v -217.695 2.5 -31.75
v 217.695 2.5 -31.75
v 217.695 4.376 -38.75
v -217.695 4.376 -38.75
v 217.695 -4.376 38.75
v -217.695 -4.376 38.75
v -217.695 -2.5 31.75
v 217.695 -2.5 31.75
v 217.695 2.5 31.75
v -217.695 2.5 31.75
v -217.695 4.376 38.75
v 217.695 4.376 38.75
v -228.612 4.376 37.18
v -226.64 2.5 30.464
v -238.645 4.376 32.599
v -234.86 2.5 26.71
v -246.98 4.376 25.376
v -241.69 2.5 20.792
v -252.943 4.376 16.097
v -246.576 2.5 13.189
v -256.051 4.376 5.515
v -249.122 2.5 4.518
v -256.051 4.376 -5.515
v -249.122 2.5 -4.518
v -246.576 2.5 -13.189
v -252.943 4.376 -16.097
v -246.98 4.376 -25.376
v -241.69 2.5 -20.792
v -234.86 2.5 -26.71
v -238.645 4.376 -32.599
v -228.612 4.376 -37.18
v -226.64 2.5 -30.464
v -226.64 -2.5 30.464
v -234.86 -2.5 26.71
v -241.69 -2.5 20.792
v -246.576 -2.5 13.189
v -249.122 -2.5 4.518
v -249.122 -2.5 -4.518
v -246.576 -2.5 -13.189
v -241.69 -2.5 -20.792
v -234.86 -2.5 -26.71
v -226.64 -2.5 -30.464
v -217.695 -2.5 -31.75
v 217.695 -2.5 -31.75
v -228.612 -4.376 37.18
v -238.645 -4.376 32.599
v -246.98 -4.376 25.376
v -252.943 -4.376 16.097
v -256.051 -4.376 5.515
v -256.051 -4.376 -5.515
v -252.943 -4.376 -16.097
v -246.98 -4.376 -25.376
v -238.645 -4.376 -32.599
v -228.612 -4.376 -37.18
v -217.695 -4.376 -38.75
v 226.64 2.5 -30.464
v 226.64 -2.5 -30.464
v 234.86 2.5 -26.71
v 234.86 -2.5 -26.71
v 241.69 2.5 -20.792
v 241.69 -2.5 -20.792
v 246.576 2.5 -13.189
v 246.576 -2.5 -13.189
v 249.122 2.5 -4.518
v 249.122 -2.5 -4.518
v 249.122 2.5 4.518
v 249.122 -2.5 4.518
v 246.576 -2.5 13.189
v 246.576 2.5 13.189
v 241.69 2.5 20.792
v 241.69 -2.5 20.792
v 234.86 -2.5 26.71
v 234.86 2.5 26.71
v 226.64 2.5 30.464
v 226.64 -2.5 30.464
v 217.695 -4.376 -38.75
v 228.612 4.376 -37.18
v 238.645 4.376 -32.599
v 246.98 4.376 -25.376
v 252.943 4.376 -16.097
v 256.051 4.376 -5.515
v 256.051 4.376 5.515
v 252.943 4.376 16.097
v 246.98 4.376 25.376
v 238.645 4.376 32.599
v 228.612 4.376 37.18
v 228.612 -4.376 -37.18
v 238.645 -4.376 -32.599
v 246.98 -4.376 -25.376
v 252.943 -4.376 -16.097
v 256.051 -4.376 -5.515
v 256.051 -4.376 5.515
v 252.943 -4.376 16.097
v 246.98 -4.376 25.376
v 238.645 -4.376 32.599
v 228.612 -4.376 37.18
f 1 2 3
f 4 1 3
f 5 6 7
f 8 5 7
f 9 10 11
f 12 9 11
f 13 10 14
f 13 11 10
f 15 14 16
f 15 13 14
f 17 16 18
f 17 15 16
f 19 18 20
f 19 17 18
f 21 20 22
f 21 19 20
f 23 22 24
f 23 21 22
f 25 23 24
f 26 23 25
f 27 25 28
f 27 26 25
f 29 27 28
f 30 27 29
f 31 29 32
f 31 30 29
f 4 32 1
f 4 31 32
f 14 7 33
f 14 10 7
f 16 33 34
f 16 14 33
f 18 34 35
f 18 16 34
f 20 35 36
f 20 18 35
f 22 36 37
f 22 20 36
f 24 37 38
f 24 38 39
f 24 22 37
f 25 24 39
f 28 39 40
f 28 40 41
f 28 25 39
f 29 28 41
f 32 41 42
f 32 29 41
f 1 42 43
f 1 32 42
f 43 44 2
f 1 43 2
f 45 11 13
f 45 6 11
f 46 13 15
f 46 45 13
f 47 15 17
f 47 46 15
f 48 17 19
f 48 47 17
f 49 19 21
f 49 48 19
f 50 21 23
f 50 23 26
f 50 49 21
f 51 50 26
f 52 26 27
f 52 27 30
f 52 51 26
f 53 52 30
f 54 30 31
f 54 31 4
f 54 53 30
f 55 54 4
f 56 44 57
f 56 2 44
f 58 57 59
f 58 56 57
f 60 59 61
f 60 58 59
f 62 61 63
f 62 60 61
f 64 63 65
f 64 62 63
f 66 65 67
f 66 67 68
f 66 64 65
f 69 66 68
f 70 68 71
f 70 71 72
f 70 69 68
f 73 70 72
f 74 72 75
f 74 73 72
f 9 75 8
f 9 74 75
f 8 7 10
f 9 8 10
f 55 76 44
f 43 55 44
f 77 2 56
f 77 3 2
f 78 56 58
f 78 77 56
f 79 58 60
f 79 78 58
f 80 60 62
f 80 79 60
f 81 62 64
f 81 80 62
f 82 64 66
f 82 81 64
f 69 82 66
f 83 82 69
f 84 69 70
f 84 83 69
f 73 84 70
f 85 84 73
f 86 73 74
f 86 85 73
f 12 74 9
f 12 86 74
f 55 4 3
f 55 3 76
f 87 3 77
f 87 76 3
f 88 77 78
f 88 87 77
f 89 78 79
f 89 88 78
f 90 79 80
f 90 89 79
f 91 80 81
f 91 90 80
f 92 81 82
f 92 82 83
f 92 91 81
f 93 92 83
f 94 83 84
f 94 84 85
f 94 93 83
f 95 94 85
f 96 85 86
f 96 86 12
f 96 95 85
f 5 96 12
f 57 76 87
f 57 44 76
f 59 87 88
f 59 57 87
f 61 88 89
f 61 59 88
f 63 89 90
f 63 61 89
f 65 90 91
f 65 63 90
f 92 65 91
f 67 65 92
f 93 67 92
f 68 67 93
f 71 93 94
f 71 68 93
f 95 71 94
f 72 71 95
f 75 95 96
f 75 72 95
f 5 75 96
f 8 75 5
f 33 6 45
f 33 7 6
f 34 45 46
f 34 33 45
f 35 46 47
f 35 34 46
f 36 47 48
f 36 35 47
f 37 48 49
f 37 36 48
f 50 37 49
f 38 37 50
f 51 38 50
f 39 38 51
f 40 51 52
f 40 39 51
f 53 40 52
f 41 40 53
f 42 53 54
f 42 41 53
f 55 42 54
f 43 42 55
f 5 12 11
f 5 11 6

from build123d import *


with BuildPart() as part:
    # Sweep1: sweep along a path in Sketch1
    with BuildLine(Plane(origin=(0, 0, 0), x_dir=(1, 0, 0), z_dir=(0, 1, 0))) as sweep1_path:
        Line((-217.695, 31.75), (217.695, 31.75))
        ThreePointArc((217.695, 31.75), (249.445, 0), (217.695, -31.75))
        Line((217.695, -31.75), (-217.695, -31.75))
        ThreePointArc((-217.695, -31.75), (-249.445, 0), (-217.695, 31.75))
    # Sketch2 → Sweep1 (sweep)
    with BuildSketch(Plane(origin=(0, 0, 0), x_dir=(0, 0, -1), z_dir=(1, 0, 0))):
        Polygon((-38.75, 4.375644347), (-31.75, 2.5), (-31.75, -2.5), (-38.75, -4.375644347), align=None)
    sweep(path=sweep1_path.line)


solid = part.part
